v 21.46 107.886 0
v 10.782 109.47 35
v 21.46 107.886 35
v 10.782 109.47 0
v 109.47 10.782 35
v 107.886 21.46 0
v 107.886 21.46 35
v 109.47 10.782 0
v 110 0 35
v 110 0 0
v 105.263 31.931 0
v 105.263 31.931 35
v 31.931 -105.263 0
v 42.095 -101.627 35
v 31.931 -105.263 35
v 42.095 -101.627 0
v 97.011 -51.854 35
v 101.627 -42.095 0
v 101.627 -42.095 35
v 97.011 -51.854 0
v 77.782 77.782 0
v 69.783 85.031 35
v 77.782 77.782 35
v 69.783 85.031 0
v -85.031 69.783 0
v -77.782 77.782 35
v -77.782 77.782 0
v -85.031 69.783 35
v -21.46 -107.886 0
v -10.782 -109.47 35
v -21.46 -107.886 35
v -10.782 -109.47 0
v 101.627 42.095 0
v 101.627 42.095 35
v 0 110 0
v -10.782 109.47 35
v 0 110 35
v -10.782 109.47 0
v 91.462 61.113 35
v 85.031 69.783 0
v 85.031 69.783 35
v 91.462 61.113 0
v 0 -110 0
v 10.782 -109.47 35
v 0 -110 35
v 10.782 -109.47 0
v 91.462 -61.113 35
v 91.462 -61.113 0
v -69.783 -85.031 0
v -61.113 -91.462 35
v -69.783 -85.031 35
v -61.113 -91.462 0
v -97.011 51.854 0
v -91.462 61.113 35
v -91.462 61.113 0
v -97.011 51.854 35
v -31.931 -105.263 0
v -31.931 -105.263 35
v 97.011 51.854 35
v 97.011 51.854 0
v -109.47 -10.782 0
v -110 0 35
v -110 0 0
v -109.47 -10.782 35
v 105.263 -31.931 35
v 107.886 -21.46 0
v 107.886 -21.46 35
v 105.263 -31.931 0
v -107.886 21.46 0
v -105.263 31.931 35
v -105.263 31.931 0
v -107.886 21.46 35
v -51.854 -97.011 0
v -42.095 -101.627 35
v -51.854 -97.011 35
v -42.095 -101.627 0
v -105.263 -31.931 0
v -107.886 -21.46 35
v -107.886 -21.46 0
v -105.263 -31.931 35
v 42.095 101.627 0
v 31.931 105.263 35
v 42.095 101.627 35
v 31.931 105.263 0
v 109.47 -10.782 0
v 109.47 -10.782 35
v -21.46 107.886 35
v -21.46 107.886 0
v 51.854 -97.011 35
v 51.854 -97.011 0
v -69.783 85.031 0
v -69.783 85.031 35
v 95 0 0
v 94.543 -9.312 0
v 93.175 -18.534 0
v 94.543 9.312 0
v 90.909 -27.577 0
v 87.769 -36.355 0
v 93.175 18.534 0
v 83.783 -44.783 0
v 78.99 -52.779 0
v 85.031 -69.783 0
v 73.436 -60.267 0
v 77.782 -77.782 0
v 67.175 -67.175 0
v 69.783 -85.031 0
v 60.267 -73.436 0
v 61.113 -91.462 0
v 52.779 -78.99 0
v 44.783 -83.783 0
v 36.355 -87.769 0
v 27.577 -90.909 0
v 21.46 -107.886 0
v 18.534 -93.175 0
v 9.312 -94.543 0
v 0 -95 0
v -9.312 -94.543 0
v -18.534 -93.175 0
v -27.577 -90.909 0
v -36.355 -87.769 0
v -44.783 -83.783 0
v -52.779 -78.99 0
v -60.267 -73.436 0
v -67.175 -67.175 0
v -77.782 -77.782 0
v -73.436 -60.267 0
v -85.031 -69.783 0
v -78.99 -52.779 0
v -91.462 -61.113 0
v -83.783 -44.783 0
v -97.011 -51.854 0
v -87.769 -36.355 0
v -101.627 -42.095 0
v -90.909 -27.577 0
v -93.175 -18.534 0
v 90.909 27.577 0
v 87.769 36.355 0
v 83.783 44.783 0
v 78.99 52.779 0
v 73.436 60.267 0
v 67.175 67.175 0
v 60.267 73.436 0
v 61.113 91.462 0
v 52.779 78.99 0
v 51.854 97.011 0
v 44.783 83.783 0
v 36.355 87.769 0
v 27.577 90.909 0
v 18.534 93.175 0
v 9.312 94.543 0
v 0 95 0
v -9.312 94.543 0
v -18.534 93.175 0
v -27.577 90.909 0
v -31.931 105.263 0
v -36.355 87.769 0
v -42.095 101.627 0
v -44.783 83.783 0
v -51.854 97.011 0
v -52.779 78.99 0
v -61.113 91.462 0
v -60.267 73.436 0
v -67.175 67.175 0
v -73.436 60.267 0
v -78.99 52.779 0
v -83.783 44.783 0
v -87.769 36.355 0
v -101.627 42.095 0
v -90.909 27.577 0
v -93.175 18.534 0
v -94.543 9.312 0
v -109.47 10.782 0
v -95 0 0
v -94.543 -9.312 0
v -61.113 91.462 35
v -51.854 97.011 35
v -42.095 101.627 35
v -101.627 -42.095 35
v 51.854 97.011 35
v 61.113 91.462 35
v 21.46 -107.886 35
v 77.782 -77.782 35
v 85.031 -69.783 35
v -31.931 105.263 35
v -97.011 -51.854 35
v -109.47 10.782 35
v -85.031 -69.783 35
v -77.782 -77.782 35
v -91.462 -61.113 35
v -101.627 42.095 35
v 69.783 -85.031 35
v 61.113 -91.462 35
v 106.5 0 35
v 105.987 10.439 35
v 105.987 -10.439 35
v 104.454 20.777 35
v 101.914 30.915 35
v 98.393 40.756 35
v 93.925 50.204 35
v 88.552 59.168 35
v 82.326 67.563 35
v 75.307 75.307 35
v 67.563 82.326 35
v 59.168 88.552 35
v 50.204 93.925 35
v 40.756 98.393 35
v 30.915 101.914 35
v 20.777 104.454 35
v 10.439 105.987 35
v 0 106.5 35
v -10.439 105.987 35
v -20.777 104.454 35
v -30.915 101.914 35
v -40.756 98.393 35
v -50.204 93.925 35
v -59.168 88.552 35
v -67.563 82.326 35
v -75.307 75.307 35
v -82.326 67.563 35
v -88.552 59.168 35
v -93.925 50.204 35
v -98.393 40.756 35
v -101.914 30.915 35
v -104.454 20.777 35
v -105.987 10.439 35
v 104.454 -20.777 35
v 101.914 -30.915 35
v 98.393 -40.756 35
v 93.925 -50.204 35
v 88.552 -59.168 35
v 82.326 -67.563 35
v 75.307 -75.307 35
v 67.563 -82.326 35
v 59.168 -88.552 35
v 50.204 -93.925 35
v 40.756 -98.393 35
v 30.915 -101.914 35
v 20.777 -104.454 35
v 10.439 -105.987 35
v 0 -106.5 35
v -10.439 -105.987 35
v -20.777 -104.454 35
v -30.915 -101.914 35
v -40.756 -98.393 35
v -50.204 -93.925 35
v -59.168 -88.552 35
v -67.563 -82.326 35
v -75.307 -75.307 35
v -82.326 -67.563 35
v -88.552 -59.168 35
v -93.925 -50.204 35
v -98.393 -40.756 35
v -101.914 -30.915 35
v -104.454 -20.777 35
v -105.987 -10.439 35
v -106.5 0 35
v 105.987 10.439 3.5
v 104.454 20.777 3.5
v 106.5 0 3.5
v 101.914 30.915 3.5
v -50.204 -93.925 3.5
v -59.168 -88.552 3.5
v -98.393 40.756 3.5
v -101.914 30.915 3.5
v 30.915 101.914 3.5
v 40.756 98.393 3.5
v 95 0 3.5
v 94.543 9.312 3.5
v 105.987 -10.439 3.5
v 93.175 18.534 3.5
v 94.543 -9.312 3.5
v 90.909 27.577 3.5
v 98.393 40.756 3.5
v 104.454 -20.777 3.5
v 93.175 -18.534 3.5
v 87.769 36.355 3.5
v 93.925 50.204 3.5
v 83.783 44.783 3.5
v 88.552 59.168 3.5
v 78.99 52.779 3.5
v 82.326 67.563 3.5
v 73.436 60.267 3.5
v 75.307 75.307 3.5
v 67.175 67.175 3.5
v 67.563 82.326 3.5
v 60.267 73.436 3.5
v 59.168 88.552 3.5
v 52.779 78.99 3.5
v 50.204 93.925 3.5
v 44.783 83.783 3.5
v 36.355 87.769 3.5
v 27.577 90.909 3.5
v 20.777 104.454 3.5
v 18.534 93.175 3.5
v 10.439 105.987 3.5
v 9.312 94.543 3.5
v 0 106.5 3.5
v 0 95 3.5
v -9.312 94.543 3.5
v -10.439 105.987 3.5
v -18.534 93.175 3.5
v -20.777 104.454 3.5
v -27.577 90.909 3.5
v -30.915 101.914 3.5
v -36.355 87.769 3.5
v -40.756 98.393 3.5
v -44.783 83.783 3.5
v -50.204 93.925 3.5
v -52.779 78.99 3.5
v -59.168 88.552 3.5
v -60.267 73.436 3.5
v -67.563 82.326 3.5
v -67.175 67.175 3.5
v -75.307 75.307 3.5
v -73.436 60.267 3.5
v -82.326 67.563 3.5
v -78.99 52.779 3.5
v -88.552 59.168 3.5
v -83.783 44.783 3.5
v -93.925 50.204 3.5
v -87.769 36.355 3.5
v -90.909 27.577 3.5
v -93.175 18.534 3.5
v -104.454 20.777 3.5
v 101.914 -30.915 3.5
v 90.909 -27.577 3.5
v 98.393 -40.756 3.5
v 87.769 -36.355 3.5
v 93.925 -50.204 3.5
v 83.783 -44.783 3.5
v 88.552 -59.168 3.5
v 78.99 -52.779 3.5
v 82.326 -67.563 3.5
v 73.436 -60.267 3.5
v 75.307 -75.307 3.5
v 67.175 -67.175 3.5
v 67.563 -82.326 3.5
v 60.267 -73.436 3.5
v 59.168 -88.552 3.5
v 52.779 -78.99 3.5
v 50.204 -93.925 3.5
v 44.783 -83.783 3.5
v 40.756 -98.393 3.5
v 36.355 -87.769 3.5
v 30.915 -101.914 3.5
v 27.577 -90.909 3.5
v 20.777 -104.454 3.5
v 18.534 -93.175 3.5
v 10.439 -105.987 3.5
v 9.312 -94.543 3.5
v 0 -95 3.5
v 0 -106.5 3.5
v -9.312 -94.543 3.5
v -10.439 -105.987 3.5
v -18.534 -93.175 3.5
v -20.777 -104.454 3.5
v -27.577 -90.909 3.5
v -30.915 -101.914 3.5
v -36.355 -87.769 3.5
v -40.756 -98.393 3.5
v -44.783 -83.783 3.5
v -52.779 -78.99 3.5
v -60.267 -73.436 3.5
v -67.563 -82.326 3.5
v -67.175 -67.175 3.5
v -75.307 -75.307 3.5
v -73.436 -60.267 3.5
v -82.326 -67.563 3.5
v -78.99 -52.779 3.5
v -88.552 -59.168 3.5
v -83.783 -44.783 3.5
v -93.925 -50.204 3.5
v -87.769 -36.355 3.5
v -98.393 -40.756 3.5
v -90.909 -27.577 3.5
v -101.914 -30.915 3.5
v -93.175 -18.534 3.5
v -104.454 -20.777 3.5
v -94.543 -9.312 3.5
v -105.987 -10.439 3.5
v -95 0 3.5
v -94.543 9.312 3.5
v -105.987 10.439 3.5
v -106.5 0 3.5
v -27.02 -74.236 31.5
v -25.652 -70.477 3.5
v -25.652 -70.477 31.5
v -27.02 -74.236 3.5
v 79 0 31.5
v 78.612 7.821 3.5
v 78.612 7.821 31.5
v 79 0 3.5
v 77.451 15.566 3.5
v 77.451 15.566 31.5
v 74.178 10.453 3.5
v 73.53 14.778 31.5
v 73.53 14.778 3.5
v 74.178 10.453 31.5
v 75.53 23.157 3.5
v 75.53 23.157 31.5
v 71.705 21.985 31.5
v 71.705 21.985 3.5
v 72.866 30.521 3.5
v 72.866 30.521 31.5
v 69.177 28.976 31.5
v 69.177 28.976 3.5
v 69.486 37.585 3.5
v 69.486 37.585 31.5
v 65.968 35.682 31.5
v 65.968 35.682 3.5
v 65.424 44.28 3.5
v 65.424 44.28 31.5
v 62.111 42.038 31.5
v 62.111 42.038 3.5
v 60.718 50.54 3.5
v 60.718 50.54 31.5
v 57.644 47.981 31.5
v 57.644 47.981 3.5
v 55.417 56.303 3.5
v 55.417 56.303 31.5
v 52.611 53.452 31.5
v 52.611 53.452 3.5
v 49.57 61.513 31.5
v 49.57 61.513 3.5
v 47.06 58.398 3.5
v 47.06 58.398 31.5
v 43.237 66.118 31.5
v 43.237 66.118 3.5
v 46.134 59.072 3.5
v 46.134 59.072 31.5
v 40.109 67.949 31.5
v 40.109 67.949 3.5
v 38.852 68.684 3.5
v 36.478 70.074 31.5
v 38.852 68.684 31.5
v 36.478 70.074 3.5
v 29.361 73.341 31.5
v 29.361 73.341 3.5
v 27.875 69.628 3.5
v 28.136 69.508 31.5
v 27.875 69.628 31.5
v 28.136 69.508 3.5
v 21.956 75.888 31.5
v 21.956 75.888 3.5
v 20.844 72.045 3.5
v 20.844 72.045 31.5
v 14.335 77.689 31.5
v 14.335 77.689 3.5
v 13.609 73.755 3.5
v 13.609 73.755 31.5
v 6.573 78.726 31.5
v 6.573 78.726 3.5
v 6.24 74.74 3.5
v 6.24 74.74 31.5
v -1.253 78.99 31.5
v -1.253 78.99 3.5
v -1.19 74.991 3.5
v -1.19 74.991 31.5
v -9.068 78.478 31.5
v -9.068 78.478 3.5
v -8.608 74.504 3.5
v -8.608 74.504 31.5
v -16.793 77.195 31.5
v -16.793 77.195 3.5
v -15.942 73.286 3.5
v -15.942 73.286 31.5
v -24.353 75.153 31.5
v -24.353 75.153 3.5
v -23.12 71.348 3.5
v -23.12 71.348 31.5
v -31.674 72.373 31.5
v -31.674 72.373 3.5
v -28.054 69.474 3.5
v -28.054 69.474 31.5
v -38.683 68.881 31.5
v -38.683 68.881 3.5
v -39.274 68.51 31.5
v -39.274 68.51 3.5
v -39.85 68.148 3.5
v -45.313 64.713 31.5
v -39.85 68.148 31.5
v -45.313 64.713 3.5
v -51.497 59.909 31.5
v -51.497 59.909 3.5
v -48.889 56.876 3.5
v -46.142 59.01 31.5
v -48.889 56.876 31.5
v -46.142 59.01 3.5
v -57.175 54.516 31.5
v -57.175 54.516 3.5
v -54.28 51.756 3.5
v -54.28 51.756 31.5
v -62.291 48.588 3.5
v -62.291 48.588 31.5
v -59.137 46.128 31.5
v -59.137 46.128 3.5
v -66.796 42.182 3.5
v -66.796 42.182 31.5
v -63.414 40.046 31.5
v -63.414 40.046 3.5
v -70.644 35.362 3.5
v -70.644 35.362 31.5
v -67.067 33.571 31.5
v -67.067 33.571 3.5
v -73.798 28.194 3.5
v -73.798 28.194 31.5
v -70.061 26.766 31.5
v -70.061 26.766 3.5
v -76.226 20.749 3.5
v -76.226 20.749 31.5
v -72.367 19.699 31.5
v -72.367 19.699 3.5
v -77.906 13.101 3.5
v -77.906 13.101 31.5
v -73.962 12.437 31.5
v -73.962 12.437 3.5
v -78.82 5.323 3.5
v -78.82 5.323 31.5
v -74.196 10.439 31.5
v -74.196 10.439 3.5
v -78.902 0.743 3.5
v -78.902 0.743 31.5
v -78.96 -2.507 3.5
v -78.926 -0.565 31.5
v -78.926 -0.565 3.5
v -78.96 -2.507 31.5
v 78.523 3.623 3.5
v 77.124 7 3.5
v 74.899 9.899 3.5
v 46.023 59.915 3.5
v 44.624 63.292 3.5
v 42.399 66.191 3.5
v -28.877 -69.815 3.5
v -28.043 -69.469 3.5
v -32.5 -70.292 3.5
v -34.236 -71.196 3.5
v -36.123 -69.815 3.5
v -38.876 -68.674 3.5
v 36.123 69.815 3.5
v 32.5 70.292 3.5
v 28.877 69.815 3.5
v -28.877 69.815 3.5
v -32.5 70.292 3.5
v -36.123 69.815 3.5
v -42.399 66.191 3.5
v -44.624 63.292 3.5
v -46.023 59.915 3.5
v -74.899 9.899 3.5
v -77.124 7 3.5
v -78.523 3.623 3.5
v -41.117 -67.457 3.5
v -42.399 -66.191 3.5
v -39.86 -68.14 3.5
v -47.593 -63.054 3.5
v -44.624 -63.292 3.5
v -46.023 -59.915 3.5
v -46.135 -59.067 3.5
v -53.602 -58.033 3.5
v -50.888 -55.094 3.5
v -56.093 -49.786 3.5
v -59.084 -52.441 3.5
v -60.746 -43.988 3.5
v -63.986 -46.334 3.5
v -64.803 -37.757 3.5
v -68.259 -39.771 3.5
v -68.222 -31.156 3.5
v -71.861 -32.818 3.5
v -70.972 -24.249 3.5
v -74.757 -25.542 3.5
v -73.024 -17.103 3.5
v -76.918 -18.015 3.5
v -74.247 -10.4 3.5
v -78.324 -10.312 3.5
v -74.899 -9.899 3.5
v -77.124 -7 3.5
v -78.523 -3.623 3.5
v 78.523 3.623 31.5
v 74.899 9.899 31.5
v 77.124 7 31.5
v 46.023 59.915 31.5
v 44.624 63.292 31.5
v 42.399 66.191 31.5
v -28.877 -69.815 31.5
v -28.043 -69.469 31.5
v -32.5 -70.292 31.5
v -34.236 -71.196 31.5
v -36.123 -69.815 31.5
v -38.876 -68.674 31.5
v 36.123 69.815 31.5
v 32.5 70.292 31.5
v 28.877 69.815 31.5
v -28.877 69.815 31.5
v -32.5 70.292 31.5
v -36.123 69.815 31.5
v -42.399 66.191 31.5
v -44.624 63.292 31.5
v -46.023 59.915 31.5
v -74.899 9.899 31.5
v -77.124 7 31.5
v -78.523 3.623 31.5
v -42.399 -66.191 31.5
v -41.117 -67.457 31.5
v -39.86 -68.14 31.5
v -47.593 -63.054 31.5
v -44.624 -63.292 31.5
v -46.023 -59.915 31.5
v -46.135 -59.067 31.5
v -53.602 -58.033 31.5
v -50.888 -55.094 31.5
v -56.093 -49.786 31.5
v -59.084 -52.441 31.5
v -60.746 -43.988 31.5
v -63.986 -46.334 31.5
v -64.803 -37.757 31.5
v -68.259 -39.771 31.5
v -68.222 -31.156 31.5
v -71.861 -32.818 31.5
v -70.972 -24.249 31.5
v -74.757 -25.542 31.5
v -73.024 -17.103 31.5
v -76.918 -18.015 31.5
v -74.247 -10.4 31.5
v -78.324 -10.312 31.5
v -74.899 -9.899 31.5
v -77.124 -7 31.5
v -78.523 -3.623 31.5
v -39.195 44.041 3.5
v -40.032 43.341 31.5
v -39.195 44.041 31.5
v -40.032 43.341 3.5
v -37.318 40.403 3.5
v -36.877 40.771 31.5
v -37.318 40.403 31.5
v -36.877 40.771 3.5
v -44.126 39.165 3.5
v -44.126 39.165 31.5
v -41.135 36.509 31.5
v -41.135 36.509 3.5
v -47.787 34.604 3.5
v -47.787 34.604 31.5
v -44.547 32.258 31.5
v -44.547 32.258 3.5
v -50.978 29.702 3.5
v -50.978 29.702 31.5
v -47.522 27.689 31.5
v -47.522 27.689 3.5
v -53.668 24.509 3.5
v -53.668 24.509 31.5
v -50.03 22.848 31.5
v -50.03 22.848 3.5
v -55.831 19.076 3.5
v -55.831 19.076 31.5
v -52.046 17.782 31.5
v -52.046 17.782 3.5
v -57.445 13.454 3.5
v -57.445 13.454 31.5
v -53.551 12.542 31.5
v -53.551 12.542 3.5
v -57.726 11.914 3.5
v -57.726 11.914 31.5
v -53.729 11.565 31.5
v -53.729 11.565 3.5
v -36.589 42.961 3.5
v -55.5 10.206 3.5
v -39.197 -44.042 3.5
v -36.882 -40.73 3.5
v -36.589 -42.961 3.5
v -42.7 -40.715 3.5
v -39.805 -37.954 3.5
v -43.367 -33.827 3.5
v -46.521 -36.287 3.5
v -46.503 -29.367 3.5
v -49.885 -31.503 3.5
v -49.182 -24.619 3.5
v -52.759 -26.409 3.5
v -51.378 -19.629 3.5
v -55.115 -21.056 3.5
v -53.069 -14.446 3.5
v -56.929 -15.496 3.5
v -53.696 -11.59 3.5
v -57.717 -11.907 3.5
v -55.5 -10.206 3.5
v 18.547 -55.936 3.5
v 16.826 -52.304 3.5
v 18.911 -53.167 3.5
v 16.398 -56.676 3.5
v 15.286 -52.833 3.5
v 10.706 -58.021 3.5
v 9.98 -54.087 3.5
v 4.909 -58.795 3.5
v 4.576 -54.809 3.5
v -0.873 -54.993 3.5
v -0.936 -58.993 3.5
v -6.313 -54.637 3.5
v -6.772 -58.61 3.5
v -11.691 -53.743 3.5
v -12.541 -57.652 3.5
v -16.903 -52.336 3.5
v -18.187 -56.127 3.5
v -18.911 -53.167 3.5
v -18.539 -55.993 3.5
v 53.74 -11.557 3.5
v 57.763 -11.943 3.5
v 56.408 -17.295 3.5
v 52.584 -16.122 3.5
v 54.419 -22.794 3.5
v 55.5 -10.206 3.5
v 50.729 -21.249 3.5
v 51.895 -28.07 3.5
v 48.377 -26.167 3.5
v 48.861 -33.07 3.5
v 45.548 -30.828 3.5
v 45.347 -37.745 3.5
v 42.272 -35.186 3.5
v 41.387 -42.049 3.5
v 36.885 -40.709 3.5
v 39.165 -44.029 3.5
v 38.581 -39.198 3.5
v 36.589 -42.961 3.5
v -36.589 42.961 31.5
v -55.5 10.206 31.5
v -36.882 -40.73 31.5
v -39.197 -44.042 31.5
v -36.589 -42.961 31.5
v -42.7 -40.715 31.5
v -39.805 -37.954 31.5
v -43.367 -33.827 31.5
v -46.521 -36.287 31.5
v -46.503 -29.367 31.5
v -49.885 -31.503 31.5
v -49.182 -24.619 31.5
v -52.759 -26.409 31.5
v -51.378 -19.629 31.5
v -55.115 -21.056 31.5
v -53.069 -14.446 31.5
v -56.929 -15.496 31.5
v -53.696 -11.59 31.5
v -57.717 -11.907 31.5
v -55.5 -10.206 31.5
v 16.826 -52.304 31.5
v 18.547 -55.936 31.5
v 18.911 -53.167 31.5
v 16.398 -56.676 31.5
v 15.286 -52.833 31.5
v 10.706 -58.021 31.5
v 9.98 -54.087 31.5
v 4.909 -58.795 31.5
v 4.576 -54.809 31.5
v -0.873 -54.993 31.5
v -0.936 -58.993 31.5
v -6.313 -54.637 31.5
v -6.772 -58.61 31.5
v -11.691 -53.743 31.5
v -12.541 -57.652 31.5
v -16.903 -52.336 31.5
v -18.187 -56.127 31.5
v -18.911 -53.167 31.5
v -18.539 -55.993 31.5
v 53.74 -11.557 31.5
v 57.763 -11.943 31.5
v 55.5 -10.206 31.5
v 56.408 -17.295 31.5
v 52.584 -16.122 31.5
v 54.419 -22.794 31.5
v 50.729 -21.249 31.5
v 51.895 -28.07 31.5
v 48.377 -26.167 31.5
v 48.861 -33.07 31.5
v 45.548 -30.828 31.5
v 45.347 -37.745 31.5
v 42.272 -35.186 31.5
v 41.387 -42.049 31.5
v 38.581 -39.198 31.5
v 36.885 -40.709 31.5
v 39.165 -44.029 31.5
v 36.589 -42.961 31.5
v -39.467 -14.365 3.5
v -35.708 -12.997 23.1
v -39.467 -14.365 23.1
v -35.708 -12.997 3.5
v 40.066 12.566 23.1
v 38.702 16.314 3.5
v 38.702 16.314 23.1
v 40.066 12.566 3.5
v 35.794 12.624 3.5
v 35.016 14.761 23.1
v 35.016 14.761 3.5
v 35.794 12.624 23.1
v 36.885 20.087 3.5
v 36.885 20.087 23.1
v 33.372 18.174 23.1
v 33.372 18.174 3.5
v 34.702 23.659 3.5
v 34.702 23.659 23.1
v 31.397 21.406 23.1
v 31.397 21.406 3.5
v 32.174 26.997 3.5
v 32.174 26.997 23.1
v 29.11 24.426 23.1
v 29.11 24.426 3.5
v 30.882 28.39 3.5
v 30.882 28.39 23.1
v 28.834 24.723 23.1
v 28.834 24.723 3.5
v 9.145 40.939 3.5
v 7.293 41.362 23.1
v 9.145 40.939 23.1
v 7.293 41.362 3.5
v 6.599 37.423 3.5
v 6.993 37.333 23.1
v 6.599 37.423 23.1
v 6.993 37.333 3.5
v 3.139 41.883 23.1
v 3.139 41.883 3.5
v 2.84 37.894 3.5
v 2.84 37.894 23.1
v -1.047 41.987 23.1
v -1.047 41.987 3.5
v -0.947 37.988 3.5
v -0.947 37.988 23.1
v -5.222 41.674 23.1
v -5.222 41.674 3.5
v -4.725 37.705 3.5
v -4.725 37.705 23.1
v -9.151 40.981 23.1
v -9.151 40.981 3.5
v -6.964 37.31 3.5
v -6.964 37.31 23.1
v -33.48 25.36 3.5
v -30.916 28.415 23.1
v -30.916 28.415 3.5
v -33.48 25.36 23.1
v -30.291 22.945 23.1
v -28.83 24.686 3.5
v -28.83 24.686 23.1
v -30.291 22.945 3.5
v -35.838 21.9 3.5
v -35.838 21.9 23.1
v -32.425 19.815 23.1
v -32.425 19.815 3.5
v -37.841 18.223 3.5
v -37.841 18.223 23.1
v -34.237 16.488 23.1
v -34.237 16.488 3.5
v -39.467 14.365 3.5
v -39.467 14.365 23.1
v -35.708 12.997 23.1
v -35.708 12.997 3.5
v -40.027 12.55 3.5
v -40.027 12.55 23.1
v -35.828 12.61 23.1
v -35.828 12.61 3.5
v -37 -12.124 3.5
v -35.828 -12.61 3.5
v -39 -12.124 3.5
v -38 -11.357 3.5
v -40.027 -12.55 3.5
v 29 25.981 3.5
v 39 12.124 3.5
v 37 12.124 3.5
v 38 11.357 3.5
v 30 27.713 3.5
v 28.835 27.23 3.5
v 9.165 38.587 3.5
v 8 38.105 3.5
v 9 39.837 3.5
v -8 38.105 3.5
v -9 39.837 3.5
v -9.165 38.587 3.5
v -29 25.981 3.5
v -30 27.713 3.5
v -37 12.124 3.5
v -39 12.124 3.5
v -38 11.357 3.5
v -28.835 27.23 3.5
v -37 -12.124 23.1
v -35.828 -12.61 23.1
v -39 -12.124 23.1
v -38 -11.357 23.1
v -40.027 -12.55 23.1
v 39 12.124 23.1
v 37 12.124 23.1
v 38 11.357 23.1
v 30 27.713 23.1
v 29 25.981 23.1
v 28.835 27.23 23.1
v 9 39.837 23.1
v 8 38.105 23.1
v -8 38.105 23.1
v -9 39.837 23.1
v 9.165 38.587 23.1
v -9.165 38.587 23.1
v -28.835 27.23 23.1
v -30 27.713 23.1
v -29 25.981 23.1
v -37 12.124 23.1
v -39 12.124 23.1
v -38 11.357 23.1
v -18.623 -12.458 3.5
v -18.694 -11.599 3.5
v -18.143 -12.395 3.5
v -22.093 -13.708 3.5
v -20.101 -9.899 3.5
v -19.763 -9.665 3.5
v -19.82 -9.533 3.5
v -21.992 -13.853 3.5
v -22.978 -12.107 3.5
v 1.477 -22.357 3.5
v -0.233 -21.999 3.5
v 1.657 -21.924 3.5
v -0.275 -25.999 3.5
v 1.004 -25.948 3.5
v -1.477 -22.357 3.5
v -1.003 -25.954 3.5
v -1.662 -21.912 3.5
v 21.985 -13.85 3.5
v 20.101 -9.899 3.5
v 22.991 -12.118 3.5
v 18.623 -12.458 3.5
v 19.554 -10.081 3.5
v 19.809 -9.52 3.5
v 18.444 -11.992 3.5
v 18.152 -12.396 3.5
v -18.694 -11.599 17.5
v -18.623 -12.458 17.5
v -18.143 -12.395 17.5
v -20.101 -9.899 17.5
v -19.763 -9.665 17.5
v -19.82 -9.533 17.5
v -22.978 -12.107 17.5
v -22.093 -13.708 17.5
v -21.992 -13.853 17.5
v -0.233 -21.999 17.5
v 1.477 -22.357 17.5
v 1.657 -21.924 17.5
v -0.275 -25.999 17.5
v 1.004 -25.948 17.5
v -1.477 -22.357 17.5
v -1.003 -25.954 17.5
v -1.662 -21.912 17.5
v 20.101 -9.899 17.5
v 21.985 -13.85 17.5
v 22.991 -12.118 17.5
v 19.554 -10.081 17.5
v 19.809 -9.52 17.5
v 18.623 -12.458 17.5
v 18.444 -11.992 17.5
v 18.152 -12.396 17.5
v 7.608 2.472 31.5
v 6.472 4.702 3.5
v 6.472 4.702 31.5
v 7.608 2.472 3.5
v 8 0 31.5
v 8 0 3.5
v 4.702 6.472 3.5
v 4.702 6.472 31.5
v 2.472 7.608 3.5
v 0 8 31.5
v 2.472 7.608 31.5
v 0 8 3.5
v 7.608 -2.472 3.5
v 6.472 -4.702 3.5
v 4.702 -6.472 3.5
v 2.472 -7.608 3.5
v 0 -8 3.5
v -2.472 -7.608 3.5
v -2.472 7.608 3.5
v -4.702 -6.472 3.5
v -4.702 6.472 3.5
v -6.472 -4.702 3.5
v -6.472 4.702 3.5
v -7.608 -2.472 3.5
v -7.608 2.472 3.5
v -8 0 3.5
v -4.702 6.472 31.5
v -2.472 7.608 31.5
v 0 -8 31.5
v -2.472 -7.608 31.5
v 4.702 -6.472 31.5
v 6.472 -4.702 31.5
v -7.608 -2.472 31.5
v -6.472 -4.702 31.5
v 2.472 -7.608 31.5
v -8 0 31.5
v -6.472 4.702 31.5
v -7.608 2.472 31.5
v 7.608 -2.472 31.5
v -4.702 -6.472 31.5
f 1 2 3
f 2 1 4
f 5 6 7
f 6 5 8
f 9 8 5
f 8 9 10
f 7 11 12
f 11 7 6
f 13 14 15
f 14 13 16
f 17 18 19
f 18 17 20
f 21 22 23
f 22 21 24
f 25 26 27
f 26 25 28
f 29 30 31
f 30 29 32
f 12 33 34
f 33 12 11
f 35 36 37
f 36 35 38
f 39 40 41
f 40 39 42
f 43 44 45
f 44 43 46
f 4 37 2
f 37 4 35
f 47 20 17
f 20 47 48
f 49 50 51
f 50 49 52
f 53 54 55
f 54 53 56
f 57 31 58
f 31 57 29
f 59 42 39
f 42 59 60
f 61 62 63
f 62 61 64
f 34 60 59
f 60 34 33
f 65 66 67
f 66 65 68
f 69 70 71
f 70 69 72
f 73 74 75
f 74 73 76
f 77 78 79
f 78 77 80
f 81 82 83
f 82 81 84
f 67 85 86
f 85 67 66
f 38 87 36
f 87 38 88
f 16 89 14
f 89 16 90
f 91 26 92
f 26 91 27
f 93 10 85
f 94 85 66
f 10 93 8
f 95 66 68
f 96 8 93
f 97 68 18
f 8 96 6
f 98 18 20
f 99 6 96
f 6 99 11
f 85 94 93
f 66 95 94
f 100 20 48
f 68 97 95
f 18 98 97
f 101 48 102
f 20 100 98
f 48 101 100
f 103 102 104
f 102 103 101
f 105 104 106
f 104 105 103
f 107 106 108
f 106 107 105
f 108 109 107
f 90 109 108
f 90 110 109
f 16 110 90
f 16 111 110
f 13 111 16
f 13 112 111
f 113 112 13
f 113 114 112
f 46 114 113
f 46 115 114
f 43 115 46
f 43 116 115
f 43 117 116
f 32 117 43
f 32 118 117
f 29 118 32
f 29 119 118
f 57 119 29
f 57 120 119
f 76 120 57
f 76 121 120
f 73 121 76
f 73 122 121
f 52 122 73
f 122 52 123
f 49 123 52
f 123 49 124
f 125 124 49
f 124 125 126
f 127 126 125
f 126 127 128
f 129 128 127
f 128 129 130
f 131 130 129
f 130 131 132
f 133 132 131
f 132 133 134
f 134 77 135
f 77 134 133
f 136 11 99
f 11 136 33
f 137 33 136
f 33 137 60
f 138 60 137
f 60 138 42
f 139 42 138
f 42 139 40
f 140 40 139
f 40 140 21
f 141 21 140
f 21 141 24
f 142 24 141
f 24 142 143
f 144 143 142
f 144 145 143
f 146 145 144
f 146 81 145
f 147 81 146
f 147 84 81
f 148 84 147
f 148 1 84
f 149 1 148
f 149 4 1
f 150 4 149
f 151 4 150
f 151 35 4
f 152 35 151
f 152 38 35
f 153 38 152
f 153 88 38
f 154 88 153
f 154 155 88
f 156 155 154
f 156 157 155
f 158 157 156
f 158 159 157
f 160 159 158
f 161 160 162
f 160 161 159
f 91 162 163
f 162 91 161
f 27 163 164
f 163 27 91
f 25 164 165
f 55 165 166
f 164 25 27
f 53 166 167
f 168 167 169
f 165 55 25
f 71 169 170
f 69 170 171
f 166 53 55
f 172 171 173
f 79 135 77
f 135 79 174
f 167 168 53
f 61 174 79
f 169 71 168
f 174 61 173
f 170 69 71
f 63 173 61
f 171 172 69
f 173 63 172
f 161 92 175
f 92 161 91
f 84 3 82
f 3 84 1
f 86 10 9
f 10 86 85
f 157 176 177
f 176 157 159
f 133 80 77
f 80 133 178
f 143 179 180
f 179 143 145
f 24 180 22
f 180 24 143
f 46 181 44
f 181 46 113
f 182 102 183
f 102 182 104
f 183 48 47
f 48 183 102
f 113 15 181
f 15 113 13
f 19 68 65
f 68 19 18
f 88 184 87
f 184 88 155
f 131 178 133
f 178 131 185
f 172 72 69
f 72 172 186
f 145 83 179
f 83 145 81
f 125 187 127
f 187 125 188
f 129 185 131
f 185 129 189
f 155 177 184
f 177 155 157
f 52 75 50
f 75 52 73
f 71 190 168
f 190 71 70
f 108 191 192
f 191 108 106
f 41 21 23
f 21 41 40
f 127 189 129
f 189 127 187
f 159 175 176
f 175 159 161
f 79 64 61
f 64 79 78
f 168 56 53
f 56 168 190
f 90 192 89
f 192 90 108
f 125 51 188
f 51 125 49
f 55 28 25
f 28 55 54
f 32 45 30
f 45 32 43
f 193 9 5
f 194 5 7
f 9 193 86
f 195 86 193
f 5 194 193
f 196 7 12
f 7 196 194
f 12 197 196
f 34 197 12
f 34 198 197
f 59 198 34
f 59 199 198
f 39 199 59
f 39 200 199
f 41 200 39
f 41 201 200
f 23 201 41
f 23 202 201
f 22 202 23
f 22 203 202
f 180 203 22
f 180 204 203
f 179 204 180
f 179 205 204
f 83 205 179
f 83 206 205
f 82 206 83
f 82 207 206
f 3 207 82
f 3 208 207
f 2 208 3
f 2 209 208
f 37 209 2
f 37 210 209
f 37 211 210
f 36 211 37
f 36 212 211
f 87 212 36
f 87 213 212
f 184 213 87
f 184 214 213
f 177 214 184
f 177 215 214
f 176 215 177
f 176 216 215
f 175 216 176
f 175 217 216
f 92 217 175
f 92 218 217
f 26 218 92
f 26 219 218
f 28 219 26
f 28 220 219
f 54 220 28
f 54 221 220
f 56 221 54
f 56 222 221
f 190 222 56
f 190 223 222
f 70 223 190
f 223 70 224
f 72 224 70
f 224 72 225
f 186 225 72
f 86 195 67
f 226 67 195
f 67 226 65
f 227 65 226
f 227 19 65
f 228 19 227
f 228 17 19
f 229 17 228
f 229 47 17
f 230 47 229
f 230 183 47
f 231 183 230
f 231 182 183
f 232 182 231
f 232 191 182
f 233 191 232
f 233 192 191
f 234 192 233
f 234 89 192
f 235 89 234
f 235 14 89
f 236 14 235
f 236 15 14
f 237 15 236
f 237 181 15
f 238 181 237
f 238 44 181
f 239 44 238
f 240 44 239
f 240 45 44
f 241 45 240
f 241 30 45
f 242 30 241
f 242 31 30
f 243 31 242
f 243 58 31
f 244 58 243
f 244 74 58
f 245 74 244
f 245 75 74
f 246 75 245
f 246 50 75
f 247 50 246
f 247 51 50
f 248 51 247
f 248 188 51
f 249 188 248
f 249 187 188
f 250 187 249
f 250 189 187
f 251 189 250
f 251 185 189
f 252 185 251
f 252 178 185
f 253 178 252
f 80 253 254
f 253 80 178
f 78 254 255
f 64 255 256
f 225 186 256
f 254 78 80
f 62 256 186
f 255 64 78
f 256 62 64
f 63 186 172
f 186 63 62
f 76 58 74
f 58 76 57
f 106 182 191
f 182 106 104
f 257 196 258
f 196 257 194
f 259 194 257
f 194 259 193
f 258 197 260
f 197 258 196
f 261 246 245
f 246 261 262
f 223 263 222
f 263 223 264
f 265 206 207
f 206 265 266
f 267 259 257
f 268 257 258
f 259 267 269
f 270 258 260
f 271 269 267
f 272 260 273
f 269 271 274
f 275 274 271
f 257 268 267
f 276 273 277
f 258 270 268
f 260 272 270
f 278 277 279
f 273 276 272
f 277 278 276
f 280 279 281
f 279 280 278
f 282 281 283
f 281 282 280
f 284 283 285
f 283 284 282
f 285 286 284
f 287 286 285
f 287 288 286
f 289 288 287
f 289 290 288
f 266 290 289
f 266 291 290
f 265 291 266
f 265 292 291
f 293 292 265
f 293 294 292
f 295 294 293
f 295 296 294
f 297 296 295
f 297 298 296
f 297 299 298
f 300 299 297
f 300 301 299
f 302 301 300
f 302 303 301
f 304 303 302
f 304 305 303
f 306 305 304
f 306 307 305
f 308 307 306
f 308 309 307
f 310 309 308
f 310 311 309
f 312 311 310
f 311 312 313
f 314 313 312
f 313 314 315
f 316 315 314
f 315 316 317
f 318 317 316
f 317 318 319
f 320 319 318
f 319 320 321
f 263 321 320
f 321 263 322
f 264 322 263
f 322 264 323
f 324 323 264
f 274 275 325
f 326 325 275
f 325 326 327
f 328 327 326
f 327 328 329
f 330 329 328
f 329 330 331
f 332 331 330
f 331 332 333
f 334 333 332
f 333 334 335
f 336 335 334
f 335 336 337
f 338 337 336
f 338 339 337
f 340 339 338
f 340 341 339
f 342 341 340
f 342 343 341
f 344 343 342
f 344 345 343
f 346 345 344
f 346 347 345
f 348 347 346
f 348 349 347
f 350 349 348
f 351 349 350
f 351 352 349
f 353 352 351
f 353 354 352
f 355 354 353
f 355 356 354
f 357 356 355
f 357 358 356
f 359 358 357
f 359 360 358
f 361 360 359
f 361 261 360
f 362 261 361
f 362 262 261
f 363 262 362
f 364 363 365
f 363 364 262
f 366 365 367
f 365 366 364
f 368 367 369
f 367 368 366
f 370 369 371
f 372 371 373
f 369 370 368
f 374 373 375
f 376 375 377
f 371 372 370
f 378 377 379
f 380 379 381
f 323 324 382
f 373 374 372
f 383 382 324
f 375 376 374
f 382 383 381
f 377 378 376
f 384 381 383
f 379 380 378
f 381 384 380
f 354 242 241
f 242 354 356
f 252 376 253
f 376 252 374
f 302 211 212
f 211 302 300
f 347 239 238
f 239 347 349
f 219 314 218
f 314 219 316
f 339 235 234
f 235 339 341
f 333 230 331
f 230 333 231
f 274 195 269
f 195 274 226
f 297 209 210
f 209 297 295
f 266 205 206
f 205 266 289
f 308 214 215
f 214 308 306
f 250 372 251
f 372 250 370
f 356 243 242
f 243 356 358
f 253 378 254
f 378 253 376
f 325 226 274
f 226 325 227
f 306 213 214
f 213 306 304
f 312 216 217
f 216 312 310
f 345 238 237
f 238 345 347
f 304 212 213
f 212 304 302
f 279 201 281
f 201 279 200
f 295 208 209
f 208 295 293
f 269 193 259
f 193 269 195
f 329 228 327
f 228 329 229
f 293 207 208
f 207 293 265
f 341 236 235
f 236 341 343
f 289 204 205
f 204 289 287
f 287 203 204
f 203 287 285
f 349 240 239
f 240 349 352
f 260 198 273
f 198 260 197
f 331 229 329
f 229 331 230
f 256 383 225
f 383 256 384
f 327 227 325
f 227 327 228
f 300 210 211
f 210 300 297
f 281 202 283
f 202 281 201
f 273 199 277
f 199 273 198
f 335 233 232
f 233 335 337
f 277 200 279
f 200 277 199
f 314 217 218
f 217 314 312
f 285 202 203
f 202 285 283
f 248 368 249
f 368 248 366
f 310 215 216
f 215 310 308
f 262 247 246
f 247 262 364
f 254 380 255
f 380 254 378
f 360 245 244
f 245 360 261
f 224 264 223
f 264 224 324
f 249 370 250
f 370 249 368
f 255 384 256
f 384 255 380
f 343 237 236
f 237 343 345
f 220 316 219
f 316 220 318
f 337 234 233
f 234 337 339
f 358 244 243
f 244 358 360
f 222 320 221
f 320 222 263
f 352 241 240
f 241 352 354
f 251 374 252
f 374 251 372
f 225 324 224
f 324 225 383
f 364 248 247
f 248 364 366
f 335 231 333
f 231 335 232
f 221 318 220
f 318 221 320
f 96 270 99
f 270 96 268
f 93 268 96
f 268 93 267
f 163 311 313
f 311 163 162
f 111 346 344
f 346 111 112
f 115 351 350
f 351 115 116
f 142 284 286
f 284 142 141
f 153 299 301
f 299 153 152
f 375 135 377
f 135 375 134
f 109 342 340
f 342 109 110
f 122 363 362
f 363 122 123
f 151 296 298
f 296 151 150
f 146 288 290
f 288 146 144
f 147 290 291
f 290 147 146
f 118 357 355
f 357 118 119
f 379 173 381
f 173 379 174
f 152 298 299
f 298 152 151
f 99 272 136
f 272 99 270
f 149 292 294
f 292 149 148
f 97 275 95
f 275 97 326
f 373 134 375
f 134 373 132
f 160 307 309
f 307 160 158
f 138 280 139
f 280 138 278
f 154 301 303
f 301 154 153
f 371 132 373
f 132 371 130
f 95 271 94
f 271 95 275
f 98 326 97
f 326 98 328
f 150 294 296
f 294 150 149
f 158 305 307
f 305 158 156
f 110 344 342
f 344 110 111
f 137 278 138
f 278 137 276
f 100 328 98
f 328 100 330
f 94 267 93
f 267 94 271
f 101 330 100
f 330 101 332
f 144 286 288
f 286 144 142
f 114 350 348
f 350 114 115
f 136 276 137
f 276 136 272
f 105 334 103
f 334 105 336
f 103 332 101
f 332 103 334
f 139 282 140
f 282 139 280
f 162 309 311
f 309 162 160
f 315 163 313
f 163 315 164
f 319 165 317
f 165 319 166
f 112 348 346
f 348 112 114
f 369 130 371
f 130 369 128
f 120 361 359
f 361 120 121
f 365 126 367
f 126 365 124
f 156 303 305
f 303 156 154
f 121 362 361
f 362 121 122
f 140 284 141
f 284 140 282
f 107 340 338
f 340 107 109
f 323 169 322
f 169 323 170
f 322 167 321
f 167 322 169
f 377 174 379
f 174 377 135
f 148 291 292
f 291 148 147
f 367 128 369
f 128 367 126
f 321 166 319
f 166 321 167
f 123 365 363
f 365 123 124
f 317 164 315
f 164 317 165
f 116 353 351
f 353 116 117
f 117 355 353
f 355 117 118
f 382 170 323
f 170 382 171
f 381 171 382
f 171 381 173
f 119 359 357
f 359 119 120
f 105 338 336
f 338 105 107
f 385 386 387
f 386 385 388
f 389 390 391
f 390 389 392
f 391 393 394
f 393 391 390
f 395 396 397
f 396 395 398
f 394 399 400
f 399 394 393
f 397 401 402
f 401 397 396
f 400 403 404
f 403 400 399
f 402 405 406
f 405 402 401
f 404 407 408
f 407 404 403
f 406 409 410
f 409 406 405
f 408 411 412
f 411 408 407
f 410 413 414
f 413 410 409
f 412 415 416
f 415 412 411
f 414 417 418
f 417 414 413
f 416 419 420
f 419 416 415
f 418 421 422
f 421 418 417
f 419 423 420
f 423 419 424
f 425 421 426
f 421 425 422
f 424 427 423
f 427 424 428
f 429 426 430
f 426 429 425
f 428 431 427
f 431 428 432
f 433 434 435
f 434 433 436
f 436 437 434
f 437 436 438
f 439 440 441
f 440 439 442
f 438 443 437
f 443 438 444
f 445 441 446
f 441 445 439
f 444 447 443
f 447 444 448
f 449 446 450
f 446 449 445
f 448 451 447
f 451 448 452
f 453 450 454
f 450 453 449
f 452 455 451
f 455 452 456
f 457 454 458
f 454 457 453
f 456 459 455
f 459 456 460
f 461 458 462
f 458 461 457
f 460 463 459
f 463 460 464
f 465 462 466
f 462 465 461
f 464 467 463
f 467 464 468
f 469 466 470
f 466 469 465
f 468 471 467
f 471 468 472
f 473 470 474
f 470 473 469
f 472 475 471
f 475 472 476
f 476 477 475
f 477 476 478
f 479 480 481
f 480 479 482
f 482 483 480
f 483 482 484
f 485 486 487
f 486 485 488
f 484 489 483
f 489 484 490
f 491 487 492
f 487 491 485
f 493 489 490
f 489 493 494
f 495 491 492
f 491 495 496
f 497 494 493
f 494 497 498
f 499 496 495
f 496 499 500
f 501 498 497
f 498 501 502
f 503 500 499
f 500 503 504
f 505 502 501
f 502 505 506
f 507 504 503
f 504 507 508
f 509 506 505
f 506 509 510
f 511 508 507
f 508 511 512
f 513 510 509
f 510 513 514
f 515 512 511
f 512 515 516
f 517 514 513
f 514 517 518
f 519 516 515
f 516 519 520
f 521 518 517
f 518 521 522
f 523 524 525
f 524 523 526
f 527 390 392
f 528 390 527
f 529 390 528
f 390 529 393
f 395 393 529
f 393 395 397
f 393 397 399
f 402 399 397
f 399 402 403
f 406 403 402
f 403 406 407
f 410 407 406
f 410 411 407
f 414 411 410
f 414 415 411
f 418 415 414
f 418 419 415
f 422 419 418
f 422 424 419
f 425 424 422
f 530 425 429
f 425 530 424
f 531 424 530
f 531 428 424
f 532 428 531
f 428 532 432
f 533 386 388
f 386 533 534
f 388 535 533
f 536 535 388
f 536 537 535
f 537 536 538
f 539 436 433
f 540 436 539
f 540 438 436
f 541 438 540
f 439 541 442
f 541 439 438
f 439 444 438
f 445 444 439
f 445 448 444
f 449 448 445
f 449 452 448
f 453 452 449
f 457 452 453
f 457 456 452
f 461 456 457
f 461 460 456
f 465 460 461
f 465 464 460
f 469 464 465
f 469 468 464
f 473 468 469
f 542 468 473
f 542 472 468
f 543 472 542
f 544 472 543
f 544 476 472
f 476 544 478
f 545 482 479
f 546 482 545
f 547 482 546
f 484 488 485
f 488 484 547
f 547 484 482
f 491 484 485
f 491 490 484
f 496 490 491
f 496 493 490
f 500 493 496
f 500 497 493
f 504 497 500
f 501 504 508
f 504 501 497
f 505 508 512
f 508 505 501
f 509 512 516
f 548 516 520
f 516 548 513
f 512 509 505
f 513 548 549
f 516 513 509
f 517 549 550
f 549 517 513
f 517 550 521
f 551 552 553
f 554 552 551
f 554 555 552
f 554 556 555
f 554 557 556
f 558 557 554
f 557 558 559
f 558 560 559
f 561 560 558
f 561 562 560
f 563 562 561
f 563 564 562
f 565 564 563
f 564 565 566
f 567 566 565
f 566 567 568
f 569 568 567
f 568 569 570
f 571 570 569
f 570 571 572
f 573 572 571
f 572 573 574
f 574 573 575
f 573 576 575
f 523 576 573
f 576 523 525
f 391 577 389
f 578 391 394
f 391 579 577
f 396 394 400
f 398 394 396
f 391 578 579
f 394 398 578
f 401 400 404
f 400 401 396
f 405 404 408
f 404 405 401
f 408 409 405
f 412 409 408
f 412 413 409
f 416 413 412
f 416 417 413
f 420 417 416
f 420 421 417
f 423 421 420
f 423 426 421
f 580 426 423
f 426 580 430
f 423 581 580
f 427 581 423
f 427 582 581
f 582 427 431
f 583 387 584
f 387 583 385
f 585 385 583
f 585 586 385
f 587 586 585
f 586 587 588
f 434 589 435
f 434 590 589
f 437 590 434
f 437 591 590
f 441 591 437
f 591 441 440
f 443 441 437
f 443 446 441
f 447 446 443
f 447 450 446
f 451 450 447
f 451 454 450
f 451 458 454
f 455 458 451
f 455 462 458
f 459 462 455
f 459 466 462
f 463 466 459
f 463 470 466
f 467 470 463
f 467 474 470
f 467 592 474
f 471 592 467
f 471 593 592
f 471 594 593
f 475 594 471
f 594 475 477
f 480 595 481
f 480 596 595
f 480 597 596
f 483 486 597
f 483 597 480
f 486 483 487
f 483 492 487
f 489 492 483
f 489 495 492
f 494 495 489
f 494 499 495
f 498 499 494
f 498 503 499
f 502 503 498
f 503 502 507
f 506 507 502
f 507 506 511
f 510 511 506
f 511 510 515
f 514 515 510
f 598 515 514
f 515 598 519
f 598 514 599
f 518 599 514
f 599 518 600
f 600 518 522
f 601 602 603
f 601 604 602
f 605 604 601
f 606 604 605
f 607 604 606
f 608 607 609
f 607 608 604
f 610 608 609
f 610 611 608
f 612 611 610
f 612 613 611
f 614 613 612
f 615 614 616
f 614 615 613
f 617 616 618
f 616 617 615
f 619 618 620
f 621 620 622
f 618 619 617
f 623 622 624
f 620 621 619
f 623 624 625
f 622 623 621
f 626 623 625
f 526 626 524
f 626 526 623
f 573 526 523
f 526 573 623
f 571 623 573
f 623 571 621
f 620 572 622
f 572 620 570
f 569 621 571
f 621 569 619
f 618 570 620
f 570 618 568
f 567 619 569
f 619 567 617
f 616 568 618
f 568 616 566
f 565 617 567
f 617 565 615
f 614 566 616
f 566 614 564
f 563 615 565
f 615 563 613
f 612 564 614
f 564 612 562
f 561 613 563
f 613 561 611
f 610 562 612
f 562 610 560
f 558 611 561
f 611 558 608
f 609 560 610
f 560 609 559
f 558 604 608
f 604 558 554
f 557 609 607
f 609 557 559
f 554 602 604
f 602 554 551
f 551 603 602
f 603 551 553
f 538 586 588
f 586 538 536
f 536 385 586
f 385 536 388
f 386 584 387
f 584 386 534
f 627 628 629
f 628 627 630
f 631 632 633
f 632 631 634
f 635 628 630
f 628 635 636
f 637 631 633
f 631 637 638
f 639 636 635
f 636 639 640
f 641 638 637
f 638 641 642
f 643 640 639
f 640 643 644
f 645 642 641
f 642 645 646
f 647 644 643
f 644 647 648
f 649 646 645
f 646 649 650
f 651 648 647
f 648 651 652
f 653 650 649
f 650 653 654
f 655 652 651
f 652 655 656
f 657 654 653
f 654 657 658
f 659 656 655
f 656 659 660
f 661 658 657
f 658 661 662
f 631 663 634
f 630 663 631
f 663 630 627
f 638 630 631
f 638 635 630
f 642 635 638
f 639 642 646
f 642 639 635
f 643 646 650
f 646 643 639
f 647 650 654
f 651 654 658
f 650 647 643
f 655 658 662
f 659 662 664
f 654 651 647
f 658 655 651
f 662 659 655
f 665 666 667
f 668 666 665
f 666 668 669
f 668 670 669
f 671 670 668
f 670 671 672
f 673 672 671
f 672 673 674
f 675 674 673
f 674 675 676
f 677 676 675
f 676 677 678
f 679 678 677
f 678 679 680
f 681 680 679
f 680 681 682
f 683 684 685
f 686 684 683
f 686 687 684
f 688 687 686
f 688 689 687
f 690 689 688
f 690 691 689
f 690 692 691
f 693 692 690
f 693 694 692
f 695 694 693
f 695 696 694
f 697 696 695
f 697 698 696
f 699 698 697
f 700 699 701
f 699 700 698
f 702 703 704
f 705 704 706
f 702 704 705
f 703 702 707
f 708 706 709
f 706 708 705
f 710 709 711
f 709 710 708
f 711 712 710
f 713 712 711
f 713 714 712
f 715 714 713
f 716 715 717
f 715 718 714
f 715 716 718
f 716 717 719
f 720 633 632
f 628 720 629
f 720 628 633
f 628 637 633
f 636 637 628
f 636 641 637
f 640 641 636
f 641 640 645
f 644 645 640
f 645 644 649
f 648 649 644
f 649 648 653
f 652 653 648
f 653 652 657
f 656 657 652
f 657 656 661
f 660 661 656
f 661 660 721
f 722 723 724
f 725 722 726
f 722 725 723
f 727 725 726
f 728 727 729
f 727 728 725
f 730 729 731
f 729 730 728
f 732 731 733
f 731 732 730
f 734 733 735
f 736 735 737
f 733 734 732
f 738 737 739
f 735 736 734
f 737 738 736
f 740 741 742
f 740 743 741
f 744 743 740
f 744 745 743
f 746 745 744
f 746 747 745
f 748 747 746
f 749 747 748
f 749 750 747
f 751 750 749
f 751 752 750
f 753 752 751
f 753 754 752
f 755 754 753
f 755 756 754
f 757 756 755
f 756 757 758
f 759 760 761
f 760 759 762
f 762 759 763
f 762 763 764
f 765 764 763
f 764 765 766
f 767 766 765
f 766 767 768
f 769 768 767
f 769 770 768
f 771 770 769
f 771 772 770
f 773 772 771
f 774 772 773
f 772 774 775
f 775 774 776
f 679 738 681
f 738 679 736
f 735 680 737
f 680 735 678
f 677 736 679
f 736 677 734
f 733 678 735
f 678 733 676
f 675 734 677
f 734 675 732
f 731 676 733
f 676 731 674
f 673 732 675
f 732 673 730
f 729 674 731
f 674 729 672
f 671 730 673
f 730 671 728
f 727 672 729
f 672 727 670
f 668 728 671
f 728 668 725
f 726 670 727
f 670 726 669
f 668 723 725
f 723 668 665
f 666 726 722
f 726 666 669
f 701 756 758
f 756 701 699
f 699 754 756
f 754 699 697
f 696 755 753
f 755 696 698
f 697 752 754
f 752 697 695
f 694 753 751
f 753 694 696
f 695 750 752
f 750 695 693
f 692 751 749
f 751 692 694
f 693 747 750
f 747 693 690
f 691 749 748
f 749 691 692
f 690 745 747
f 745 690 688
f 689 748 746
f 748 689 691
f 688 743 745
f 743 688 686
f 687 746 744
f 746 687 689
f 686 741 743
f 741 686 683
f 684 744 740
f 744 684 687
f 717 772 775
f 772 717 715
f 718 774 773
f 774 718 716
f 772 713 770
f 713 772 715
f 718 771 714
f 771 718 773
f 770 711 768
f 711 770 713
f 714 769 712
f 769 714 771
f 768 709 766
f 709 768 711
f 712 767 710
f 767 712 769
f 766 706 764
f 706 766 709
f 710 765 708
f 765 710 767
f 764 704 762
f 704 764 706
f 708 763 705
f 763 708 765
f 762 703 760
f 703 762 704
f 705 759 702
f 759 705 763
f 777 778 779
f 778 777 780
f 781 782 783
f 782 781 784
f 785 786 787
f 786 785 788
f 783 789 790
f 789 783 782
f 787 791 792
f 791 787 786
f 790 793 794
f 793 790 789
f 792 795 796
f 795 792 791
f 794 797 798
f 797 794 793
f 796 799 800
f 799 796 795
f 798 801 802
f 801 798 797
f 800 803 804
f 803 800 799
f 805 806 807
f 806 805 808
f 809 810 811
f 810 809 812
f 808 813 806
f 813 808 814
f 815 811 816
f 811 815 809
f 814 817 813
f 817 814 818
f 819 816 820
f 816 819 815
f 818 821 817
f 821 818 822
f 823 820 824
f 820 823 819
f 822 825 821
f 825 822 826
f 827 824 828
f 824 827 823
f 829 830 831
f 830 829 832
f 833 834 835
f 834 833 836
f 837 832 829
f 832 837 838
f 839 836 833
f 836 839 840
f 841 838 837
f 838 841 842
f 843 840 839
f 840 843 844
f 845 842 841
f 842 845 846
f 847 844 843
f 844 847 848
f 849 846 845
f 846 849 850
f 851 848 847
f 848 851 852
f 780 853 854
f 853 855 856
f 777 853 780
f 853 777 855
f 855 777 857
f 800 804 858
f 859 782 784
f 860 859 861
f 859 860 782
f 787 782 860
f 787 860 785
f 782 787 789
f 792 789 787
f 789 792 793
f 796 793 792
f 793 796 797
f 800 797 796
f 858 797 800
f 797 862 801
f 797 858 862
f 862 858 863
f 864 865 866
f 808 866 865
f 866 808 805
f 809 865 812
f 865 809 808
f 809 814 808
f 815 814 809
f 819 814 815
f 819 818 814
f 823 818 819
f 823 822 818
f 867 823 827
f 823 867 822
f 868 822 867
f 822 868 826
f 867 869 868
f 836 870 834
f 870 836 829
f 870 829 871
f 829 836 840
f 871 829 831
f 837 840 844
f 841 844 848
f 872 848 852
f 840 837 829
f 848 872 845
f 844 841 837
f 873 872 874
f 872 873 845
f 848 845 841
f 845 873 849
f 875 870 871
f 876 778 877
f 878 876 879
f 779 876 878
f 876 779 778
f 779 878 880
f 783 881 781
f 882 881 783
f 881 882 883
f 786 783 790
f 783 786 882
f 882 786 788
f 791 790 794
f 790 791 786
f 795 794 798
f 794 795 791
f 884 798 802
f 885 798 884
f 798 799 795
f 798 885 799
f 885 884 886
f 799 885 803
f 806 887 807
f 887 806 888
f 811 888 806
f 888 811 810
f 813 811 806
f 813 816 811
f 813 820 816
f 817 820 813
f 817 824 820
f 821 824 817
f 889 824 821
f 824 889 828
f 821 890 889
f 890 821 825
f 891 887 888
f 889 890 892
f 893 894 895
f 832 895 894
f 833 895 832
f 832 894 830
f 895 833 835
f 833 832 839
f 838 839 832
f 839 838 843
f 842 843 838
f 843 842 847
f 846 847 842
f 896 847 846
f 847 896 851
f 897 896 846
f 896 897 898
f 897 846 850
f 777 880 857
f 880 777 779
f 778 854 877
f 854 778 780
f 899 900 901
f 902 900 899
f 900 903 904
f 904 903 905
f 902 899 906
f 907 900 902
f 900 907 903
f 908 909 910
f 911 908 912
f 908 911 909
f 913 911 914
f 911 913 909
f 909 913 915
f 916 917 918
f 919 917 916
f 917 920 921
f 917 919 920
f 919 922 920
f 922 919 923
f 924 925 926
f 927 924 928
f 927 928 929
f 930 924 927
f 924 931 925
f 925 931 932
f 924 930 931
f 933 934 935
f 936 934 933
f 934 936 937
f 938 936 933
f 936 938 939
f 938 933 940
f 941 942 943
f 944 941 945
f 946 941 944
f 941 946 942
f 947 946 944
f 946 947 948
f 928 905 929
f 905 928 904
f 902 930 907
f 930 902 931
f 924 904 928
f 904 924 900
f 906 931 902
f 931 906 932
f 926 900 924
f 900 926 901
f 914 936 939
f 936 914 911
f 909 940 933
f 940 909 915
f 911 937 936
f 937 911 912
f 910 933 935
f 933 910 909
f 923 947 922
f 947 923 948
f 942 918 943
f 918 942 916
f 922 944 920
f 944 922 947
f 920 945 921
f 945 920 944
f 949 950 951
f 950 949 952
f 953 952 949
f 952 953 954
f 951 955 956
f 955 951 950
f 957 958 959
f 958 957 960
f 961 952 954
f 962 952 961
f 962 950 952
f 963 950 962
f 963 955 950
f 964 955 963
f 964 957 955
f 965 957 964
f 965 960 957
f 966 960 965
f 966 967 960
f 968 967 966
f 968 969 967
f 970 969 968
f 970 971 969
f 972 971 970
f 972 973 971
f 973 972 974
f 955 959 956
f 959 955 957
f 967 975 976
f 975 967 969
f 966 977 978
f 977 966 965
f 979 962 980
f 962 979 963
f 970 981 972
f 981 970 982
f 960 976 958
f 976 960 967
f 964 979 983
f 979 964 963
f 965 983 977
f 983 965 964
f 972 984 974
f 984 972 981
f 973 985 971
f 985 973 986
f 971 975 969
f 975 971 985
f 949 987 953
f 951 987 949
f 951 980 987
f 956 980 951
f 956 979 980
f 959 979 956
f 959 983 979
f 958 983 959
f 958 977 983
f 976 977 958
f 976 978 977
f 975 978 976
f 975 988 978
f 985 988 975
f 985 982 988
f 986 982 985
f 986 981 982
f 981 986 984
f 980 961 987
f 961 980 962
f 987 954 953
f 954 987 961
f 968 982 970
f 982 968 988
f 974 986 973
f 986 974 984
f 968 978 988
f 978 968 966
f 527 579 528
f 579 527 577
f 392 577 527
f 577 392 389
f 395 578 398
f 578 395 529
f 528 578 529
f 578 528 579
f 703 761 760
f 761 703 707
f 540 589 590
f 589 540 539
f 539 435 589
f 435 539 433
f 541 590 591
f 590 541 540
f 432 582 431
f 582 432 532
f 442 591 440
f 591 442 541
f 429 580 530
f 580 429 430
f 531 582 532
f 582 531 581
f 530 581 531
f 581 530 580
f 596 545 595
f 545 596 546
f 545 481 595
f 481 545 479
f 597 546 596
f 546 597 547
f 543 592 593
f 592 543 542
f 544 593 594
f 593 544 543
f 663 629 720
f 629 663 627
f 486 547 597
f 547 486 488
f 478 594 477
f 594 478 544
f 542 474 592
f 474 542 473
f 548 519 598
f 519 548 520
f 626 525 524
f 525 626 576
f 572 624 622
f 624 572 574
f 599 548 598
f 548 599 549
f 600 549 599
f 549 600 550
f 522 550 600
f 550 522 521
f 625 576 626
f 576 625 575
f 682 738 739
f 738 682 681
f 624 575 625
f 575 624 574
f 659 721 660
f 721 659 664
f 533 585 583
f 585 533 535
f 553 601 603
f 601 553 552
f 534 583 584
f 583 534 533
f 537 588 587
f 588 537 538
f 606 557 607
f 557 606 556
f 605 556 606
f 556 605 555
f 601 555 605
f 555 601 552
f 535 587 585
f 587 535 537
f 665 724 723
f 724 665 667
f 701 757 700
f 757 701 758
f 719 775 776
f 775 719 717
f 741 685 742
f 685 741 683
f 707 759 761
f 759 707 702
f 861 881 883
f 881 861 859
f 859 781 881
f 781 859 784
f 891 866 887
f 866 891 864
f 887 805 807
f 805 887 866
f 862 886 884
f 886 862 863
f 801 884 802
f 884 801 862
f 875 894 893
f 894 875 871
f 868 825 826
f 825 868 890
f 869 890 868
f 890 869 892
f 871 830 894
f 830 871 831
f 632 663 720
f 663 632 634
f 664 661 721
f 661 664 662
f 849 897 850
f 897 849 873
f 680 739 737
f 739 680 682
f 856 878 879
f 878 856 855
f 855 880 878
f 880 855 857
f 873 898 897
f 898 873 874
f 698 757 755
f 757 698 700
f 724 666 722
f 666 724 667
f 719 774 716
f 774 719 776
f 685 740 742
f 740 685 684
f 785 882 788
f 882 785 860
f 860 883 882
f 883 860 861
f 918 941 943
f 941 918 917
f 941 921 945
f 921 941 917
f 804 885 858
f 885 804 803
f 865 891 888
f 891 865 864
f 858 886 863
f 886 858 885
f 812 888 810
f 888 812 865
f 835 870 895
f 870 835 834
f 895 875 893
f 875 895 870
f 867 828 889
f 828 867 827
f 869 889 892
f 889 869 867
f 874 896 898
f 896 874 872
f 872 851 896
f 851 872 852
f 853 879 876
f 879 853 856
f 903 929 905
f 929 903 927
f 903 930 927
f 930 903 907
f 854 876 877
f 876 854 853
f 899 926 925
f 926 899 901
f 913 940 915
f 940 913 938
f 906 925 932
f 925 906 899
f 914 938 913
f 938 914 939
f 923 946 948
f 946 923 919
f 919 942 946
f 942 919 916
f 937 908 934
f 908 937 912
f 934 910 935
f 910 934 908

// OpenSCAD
// Cat Puzzle Feeder — Slow-Feed, Anti-Boredom
// Labyrinth cats must paw kibble through — slows eating
// PETG (food-safe-ish, easy to clean) — 0.2mm, 4 walls, 20% infill
// No supports needed — all walls < 45°

D        = 220;   // Bowl diameter
H        = 35;    // Bowl height
WALL_T   = 3.5;
MAZE_H   = 28;    // Maze wall height
MAZE_T   = 4.0;   // Maze wall thickness
PORE_D   = 28;    // Kibble hole diameter (size M kibble ≈ 8mm)

module outer_bowl() {
    difference() {
        cylinder(d = D, h = H, $fn = 64);
        translate([0, 0, WALL_T])
            cylinder(d = D - WALL_T*2, h = H, $fn = 64);
        // Anti-tip feet cutout
        translate([0, 0, -1])
            cylinder(d = D - 30, h = WALL_T + 2, $fn = 64);
    }
    // Anti-tip rubber-grip feet ring
    translate([0, 0, 0])
        difference() {
            cylinder(d = D - 10, h = 3, $fn = 64);
            cylinder(d = D - 30, h = 4, $fn = 64);
        }
}

module maze_wall(r, arc_start, arc_end, h) {
    rotate([0, 0, arc_start])
        rotate_extrude(angle = arc_end - arc_start, $fn = 64)
            translate([r, 0])
                square([MAZE_T, h]);
}

module paw_holes(r) {
    for (a = [0 : 60 : 300])
        rotate([0, 0, a]) translate([r, 0, -1])
            cylinder(d = PORE_D, h = H + 2, $fn = 24);
}

difference() {
    union() {
        outer_bowl();
        // Concentric maze rings
        translate([0, 0, WALL_T]) {
            maze_wall(75,   0,   250, MAZE_H);
            maze_wall(55, 110,   360, MAZE_H);
            maze_wall(38,   0,   200, MAZE_H * 0.7);
            maze_wall(22, 160,   350, MAZE_H * 0.5);
            // Center post
            cylinder(d = 16, h = MAZE_H, $fn = 20);
        }
    }
    // Kibble entry holes at each ring gap
    paw_holes(65);
    paw_holes(46);
    paw_holes(30);
    // Logo / brand area on rim (flat)
    translate([0, D/2 - 18, H - 3])
        linear_extrude(4)
            text("CAT", size = 10, halign = "center", font = "Liberation Sans:style=Bold");
}
